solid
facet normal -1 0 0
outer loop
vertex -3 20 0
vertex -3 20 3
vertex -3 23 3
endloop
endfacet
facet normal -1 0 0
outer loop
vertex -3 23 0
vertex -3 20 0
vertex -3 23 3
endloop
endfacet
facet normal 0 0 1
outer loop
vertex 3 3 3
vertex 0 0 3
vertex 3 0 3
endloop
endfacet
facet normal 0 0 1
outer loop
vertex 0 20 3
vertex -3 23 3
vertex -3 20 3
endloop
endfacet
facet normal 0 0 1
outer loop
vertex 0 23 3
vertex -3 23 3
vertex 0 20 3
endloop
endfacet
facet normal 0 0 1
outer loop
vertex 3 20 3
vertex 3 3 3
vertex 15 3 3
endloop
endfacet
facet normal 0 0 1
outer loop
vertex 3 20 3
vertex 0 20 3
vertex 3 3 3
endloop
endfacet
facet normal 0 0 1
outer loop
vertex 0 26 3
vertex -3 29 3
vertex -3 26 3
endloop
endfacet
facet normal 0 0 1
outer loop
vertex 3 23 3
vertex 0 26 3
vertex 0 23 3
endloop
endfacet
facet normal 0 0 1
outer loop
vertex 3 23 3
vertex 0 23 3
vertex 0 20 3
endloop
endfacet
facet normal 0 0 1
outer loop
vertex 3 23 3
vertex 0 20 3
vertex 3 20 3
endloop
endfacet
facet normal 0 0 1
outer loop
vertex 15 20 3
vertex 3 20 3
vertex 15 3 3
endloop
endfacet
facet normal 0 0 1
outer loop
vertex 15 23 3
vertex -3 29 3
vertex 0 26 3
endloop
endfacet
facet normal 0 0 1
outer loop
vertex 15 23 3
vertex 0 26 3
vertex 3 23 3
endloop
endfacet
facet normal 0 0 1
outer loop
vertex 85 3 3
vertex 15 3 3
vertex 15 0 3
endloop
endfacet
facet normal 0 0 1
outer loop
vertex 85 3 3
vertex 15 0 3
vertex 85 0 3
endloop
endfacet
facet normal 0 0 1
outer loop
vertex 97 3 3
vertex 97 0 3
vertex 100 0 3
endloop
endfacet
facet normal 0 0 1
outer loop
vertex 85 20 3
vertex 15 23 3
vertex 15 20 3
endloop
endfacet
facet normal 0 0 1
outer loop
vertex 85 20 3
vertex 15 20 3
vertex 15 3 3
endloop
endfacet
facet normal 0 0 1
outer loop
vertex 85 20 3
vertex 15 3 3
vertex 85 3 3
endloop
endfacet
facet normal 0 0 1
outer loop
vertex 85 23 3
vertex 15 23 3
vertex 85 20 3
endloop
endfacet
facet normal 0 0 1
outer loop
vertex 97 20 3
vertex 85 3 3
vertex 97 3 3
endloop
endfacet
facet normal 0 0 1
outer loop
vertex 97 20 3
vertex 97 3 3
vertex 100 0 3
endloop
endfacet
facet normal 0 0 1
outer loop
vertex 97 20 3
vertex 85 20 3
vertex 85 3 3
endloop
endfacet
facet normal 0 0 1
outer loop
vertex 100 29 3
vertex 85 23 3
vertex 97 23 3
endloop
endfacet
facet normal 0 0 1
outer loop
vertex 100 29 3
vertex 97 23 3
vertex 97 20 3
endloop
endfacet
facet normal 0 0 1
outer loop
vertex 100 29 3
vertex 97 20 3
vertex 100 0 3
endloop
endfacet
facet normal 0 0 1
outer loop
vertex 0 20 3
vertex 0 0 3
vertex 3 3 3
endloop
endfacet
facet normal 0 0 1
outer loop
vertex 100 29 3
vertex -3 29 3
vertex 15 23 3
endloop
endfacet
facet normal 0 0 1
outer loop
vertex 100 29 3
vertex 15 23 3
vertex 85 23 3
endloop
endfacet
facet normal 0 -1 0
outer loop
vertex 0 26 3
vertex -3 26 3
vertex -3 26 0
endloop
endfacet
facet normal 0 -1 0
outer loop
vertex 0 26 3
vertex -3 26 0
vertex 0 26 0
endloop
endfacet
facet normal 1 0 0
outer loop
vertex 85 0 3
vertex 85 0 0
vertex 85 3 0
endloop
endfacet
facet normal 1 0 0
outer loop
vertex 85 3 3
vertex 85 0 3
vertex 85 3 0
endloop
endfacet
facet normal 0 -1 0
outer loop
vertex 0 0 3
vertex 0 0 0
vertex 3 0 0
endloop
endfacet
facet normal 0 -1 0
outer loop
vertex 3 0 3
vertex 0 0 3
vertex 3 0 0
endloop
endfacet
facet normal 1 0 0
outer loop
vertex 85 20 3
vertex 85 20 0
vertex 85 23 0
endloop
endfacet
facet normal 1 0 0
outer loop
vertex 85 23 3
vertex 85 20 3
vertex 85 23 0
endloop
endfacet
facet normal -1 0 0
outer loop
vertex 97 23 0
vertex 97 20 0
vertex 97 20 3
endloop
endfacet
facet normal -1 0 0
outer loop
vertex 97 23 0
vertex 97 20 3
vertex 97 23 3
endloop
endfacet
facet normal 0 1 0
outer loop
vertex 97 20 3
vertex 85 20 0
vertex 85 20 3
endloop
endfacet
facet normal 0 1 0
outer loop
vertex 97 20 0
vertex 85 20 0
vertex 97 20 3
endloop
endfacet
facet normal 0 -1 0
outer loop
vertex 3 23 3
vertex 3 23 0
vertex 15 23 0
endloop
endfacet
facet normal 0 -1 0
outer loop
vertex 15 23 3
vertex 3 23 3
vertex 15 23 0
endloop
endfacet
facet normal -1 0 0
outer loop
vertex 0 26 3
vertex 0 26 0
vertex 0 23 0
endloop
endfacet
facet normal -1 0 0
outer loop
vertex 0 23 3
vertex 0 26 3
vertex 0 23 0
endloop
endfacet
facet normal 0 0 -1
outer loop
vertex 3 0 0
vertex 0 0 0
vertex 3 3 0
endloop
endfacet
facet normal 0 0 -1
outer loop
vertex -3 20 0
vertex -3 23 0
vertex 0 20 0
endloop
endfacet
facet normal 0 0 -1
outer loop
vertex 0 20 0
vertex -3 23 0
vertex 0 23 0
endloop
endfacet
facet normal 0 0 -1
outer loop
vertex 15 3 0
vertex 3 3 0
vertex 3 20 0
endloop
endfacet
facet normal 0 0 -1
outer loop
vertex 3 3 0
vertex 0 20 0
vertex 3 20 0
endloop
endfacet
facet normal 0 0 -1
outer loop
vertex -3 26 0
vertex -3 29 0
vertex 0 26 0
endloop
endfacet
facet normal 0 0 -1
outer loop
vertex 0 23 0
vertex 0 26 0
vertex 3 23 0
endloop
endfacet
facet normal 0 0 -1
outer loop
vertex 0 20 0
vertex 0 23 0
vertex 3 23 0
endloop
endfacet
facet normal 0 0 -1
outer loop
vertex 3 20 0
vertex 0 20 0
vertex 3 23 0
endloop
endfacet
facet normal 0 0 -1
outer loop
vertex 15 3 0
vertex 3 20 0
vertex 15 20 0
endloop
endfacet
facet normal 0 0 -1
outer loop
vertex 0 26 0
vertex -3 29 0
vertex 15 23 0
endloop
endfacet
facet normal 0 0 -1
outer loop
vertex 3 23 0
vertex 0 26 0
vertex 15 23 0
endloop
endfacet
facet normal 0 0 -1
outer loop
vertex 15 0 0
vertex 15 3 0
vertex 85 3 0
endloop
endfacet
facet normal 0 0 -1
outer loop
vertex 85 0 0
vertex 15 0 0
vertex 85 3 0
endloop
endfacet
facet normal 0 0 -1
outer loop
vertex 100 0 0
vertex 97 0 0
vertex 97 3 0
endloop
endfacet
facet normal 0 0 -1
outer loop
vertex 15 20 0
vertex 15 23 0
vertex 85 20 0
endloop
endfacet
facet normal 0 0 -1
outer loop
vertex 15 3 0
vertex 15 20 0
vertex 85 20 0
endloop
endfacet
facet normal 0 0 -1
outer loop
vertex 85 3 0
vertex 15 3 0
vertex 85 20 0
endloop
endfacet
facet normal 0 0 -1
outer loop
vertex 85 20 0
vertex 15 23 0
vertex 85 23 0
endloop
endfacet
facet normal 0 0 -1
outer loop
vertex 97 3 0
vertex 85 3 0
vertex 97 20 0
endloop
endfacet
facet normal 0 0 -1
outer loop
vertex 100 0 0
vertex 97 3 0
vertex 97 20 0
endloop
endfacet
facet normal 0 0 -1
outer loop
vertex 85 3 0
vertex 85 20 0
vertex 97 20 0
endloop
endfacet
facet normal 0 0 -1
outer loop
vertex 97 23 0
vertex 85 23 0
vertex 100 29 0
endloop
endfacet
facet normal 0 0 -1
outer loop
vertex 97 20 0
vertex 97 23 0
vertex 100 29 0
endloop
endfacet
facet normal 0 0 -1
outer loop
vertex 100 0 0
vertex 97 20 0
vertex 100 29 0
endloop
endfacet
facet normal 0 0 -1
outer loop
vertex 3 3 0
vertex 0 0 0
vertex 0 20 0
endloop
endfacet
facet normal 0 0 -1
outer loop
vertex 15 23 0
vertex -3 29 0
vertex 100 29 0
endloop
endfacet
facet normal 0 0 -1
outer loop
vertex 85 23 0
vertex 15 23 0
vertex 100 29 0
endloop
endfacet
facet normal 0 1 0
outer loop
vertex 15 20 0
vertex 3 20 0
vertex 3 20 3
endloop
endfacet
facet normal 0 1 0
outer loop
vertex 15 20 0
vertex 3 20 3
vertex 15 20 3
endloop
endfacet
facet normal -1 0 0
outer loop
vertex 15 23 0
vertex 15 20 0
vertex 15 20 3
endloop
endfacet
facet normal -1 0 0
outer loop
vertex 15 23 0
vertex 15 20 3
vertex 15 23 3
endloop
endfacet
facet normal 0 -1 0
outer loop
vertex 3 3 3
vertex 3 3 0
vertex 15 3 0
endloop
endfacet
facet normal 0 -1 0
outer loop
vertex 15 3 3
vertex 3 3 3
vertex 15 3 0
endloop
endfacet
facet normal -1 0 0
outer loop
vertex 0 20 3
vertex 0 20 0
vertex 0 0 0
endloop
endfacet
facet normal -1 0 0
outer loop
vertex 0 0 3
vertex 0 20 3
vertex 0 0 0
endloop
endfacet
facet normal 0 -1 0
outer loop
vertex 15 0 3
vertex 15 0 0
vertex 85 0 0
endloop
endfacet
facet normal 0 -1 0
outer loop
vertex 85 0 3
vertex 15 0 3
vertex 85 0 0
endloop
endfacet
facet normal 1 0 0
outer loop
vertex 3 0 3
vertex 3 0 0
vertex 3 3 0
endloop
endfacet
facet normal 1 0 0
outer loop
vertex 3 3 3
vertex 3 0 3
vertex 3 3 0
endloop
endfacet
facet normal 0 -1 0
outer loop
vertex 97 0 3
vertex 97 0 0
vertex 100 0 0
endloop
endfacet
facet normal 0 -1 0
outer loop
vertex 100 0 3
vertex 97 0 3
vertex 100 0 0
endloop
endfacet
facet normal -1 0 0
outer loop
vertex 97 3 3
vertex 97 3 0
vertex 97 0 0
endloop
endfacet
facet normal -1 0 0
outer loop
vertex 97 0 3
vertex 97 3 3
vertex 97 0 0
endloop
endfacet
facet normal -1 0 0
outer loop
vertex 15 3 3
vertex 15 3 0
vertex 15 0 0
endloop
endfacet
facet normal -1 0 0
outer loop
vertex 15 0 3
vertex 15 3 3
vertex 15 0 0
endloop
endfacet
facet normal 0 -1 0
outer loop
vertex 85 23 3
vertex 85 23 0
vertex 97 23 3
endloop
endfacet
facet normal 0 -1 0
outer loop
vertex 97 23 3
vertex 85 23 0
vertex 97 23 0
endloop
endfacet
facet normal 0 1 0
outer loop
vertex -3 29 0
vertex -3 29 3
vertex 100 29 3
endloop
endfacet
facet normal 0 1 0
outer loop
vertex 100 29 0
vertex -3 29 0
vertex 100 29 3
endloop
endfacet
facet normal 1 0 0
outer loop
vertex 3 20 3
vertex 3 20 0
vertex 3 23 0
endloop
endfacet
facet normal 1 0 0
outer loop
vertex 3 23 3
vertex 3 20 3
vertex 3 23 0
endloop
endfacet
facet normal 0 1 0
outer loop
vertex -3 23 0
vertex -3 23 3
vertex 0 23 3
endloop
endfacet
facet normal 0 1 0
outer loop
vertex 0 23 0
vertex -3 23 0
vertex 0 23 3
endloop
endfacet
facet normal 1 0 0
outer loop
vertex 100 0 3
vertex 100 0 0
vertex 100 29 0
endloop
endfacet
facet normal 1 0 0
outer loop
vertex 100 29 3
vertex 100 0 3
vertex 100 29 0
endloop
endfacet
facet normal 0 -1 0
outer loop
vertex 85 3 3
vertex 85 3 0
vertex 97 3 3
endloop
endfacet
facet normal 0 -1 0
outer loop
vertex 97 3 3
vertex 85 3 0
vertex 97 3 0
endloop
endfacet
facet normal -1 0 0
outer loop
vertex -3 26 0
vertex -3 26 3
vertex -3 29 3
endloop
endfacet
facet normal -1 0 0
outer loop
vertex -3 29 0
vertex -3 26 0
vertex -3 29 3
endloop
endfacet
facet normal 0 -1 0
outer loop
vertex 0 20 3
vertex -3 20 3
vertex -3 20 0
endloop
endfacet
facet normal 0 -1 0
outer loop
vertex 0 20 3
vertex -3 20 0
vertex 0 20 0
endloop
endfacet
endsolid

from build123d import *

# Parameters (mm, degrees)
CROQUIS1_W              = 12
CROQUIS1_H              = 3
SALIENTE_EXTRUIR1_DEPTH = 3
CROQUIS2_W              = 3
CROQUIS2_H              = 3
SALIENTE_EXTRUIR2_DEPTH = 3


with BuildPart() as part:
    # Croquis1 → Saliente-Extruir1 (new body)
    with BuildSketch(Plane.XY):
        Polygon((0, 0), (3, 0), (3, 3), (15, 3), (15, 0), (85, 0), (85, 3), (97, 3), (97, 0), (100, 0), (100, 29), (0, 29), align=None)
        with Locations((9, 21.5)):
            Rectangle(CROQUIS1_W, CROQUIS1_H, mode=Mode.SUBTRACT)
        with Locations((91, 21.5)):
            Rectangle(CROQUIS1_W, CROQUIS1_H, mode=Mode.SUBTRACT)
    extrude(amount=SALIENTE_EXTRUIR1_DEPTH)

    # Croquis2 → Saliente-Extruir2 (add)
    with BuildSketch(Plane.XY.offset(3)):
        with Locations((-1.5, 21.5)):
            Rectangle(CROQUIS2_W, CROQUIS2_H)
        with Locations((-1.5, 27.5)):
            Rectangle(CROQUIS2_W, CROQUIS2_H)
    extrude(amount=-SALIENTE_EXTRUIR2_DEPTH)


solid = part.part
